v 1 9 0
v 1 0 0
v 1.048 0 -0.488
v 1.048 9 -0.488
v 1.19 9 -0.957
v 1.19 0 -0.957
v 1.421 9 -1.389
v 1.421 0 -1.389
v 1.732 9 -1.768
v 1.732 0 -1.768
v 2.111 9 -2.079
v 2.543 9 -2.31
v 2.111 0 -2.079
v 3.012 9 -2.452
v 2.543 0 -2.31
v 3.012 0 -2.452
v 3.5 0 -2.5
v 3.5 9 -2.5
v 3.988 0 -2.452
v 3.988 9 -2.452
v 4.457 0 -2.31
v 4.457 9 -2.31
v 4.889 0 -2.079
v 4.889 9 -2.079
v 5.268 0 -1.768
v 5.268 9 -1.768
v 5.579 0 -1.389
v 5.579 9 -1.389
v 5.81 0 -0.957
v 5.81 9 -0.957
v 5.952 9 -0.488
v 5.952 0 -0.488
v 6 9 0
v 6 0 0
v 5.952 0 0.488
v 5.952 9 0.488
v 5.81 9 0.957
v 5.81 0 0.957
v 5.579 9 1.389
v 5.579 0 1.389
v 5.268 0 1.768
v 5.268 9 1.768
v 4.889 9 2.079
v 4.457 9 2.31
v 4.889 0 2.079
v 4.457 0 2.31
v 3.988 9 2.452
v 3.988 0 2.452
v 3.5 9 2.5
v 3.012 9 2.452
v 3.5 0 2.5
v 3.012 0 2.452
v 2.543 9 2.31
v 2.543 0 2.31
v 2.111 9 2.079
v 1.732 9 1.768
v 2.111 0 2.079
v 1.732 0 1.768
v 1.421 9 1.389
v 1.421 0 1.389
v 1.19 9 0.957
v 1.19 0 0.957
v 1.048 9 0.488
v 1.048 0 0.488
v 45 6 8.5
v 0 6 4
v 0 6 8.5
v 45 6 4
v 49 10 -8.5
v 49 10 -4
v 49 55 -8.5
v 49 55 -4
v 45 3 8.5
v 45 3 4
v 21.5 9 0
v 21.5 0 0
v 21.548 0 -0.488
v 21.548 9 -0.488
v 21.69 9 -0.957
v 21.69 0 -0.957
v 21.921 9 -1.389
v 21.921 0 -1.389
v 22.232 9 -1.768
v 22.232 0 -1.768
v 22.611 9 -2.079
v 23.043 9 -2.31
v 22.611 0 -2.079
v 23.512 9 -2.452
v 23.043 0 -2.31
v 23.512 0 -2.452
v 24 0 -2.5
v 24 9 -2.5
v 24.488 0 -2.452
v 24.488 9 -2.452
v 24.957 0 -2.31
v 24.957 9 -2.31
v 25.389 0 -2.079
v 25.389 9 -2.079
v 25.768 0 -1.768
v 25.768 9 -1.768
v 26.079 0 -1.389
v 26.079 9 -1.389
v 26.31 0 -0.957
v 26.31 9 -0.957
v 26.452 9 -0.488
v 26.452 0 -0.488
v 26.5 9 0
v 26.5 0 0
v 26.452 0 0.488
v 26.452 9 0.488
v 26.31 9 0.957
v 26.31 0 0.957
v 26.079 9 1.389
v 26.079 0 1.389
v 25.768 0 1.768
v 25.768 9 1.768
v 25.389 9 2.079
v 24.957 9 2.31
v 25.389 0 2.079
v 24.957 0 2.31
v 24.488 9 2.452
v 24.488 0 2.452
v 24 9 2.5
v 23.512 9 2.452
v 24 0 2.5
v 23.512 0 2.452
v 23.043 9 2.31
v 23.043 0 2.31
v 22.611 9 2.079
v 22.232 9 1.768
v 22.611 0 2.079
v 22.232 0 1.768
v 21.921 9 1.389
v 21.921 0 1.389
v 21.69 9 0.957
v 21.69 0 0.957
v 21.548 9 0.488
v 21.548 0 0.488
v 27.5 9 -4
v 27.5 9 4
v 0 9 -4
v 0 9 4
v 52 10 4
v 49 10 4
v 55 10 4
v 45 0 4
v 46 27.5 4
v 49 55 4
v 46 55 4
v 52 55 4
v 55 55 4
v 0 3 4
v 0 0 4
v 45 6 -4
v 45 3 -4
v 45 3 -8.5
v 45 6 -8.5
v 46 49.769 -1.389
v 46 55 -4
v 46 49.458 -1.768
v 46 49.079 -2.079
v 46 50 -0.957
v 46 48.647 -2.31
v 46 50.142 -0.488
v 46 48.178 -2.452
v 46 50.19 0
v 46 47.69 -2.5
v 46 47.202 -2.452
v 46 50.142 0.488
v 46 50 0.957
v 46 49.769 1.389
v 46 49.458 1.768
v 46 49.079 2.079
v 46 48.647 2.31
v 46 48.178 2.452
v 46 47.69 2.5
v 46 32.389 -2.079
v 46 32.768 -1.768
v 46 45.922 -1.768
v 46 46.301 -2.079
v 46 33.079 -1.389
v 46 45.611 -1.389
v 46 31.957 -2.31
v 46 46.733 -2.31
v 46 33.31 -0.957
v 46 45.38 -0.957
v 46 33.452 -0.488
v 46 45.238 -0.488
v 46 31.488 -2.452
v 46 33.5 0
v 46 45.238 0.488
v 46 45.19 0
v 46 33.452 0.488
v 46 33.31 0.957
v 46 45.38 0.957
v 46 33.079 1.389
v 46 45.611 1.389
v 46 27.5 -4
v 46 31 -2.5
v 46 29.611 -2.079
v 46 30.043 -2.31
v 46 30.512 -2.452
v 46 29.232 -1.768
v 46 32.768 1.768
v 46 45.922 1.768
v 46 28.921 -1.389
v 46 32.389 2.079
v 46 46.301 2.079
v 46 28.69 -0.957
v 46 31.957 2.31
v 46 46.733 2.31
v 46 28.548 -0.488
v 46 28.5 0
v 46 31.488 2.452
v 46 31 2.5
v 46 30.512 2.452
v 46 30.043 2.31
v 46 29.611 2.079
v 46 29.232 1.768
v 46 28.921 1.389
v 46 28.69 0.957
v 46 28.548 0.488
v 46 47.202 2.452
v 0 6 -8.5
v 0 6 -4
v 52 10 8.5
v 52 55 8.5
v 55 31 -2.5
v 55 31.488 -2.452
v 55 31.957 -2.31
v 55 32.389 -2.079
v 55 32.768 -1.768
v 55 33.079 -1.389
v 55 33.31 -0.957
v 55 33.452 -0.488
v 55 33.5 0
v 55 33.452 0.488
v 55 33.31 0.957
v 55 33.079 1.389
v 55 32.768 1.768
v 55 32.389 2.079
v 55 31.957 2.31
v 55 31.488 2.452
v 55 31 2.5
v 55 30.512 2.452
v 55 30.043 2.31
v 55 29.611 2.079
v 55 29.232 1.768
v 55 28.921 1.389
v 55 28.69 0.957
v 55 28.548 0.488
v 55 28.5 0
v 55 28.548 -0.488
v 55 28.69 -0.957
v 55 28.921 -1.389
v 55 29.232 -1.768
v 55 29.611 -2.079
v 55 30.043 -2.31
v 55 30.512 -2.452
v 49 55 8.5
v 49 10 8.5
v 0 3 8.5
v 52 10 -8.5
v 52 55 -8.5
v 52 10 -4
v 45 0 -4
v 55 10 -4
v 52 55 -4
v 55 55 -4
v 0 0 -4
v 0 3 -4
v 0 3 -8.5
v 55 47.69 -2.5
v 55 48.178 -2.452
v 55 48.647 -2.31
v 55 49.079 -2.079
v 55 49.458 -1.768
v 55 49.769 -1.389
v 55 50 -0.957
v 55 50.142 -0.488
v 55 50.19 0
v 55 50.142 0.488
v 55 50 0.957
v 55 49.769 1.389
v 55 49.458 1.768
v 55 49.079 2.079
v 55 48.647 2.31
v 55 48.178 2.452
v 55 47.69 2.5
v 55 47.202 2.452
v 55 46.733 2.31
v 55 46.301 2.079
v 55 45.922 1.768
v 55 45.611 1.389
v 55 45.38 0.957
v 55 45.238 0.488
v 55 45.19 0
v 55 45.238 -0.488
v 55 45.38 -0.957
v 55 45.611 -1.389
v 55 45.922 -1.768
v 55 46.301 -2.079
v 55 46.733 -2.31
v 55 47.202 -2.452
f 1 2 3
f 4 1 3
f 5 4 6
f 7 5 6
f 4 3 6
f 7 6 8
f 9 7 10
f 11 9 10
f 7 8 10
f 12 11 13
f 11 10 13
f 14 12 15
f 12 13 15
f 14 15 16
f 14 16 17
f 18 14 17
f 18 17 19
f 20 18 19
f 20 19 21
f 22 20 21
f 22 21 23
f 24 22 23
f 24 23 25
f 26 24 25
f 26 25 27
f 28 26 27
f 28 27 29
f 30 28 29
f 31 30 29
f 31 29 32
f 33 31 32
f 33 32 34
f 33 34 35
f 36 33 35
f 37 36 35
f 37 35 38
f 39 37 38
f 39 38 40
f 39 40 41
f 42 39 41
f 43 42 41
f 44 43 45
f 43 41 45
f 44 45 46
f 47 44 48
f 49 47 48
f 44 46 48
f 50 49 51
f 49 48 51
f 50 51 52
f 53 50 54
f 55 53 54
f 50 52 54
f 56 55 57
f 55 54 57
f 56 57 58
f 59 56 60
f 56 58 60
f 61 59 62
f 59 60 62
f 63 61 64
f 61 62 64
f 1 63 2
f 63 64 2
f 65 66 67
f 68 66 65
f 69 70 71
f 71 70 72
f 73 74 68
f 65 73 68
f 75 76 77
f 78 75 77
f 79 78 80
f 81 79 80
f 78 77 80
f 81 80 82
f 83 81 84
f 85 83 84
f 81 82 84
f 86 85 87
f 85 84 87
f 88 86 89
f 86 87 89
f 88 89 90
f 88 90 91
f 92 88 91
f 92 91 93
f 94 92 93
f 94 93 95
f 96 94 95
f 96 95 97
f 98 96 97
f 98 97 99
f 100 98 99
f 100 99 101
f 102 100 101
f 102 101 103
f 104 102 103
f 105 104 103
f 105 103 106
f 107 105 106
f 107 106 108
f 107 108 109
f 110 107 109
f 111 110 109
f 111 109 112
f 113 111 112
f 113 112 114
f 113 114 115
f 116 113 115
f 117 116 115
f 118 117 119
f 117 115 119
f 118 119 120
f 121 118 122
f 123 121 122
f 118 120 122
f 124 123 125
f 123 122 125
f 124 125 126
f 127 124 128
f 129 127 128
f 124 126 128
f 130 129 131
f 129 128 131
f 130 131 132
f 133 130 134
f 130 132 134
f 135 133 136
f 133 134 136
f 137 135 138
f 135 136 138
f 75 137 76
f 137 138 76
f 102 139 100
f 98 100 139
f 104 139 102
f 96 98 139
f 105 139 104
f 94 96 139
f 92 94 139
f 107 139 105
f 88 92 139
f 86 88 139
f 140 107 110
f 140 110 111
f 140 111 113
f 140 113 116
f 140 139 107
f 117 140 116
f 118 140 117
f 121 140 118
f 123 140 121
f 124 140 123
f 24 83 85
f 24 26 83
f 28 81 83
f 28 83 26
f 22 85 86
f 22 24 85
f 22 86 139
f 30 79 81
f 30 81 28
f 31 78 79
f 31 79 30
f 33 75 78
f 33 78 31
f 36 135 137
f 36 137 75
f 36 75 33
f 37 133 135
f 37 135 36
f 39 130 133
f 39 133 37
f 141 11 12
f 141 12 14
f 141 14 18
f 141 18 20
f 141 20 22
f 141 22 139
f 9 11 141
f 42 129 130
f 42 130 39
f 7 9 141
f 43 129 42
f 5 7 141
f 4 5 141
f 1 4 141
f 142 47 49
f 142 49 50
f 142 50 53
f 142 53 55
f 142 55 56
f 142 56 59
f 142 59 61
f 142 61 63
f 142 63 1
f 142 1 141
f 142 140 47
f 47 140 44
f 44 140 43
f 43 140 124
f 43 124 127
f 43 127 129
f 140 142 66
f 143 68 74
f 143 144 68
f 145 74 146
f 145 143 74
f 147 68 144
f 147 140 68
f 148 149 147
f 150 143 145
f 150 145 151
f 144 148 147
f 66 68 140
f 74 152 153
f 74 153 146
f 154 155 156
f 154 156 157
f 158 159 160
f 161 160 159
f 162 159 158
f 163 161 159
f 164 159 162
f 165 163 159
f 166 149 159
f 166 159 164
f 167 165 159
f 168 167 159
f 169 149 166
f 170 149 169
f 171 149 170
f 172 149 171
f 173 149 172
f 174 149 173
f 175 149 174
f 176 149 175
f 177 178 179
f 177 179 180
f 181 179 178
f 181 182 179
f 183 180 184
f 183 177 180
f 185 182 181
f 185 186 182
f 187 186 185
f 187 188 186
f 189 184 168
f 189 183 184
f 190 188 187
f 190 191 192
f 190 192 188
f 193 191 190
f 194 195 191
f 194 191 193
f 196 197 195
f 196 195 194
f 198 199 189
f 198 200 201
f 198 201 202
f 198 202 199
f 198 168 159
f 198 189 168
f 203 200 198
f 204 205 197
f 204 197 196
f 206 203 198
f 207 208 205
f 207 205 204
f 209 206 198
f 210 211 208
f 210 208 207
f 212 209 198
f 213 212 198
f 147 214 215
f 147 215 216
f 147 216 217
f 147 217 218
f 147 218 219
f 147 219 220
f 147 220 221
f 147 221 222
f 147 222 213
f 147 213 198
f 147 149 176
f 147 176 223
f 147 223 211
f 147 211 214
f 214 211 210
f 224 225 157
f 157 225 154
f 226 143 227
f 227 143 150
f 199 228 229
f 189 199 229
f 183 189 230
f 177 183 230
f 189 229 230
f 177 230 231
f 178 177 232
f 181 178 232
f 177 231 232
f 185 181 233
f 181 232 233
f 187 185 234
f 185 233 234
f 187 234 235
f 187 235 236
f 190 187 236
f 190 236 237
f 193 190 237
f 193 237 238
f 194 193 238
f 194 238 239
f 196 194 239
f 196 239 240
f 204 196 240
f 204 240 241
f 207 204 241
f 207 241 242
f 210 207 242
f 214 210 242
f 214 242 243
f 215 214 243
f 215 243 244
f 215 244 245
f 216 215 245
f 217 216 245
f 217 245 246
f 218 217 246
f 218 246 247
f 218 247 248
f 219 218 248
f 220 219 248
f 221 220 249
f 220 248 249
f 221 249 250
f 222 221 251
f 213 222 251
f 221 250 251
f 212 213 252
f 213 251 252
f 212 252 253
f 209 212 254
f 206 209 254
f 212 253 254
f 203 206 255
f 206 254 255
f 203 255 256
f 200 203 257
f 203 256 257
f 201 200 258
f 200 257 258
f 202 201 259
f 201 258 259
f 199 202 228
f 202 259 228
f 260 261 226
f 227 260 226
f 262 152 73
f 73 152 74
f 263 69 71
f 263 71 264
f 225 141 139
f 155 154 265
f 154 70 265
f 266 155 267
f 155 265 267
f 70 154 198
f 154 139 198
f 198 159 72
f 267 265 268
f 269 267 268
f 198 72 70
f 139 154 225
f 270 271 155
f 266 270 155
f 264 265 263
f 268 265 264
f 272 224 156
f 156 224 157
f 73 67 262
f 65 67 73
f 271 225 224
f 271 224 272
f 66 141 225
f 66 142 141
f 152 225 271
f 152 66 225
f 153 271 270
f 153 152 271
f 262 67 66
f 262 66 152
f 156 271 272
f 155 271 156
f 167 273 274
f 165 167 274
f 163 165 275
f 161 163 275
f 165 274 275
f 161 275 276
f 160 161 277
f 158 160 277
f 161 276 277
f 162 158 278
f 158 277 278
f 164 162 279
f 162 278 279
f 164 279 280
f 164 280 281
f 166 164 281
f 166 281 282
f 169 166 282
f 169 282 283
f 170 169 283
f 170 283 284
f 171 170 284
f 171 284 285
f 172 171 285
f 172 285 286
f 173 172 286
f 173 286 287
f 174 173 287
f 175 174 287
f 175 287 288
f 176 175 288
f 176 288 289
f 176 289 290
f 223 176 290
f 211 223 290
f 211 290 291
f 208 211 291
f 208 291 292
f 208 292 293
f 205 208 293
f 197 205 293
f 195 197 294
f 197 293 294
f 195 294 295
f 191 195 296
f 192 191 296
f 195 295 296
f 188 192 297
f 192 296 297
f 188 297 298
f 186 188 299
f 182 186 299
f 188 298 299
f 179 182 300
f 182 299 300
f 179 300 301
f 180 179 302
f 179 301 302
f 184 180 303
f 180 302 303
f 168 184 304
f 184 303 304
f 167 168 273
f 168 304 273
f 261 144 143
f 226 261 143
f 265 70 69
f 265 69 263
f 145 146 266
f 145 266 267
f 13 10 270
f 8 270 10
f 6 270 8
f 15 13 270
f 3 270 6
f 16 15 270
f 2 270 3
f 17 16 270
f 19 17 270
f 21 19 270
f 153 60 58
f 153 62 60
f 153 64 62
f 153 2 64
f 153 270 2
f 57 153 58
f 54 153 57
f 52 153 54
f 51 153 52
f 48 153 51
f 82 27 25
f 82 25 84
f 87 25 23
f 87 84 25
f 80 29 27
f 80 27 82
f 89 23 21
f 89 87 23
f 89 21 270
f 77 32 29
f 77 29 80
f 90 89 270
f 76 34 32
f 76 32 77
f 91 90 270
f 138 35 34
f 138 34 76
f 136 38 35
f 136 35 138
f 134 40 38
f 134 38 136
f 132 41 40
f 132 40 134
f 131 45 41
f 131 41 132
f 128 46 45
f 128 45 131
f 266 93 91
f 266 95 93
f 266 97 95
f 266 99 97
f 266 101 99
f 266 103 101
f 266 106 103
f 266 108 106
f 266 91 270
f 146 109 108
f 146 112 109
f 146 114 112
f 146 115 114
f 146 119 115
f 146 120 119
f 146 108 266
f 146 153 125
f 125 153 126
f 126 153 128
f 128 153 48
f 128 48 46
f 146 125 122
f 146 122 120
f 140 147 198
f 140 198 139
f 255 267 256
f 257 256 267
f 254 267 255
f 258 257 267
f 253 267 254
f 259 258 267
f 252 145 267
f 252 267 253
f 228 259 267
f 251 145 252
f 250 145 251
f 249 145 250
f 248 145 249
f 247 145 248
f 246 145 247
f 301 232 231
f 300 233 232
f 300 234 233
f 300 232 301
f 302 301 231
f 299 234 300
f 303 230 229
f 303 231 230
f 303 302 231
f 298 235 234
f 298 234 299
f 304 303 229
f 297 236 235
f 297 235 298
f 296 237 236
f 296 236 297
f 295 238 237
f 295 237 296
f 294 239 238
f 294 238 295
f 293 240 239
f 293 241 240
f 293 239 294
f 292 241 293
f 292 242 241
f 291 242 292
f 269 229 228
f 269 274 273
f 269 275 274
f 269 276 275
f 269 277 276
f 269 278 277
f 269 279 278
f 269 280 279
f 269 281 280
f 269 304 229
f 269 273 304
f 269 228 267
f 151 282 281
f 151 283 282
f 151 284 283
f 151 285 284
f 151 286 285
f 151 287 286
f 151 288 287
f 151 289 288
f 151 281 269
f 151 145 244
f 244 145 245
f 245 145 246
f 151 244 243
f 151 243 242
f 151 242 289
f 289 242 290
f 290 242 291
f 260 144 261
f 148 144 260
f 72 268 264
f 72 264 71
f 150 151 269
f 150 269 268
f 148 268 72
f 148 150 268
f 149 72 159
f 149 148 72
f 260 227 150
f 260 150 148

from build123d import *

# Parameters (mm, degrees)
BOSS_EXTRUDE1_DEPTH         = 4
SKETCH3_W                   = 45
SKETCH3_H                   = 3
SKETCH3_W_2                 = 3
SKETCH3_H_2                 = 45
BOSS_EXTRUDE2_DEPTH         = 4.5
BOSS_EXTRUDE3_START         = -8
SKETCH3_2_W                 = 45
SKETCH3_2_H                 = 3
SKETCH3_2_W_2               = 3
SKETCH3_2_H_2               = 45
BOSS_EXTRUDE3_DEPTH         = 4.5
TAP_DRILL_FOR_M6X1_0_TAP1_D = 5
TAP_DRILL_FOR_M6X1_0_TAP2_D = 5


with BuildPart() as part:
    # Sketch2 → Boss-Extrude1 (new, symmetric)
    with BuildSketch(Plane.XY):
        Polygon((0, 0), (45, 0), (55, 10), (55, 55), (46, 55), (46, 27.5), (27.5, 9), (0, 9), align=None)
    extrude(amount=BOSS_EXTRUDE1_DEPTH, both=True)

    # Sketch3 → Boss-Extrude2 (add)
    with BuildSketch(Plane.XY.offset(4)):
        with Locations((22.5, 4.5)):
            Rectangle(SKETCH3_W, SKETCH3_H)
        with Locations((50.5, 32.5)):
            Rectangle(SKETCH3_W_2, SKETCH3_H_2)
    extrude(amount=BOSS_EXTRUDE2_DEPTH)

    # Sketch3<2> → Boss-Extrude3 (add)
    with BuildSketch(Plane.XY.offset(4).offset(BOSS_EXTRUDE3_START)):
        with Locations((22.5, 4.5)):
            Rectangle(SKETCH3_2_W, SKETCH3_2_H)
        with Locations((50.5, 32.5)):
            Rectangle(SKETCH3_2_W_2, SKETCH3_2_H_2)
    extrude(amount=-BOSS_EXTRUDE3_DEPTH)

    # Tap Drill for M6x1.0 Tap1 (through all)
    with Locations(Plane.ZY.offset(-46)):
        with Locations((0, 31), (0, 47.69)):
            Hole(TAP_DRILL_FOR_M6X1_0_TAP1_D / 2)

    # Tap Drill for M6x1.0 Tap2 (through all)
    with Locations(Plane(origin=(0, 9, 0), x_dir=(1, 0, 0), z_dir=(0, 1, 0))):
        with Locations((24, 0), (3.5, 0)):
            Hole(TAP_DRILL_FOR_M6X1_0_TAP2_D / 2)


solid = part.part
